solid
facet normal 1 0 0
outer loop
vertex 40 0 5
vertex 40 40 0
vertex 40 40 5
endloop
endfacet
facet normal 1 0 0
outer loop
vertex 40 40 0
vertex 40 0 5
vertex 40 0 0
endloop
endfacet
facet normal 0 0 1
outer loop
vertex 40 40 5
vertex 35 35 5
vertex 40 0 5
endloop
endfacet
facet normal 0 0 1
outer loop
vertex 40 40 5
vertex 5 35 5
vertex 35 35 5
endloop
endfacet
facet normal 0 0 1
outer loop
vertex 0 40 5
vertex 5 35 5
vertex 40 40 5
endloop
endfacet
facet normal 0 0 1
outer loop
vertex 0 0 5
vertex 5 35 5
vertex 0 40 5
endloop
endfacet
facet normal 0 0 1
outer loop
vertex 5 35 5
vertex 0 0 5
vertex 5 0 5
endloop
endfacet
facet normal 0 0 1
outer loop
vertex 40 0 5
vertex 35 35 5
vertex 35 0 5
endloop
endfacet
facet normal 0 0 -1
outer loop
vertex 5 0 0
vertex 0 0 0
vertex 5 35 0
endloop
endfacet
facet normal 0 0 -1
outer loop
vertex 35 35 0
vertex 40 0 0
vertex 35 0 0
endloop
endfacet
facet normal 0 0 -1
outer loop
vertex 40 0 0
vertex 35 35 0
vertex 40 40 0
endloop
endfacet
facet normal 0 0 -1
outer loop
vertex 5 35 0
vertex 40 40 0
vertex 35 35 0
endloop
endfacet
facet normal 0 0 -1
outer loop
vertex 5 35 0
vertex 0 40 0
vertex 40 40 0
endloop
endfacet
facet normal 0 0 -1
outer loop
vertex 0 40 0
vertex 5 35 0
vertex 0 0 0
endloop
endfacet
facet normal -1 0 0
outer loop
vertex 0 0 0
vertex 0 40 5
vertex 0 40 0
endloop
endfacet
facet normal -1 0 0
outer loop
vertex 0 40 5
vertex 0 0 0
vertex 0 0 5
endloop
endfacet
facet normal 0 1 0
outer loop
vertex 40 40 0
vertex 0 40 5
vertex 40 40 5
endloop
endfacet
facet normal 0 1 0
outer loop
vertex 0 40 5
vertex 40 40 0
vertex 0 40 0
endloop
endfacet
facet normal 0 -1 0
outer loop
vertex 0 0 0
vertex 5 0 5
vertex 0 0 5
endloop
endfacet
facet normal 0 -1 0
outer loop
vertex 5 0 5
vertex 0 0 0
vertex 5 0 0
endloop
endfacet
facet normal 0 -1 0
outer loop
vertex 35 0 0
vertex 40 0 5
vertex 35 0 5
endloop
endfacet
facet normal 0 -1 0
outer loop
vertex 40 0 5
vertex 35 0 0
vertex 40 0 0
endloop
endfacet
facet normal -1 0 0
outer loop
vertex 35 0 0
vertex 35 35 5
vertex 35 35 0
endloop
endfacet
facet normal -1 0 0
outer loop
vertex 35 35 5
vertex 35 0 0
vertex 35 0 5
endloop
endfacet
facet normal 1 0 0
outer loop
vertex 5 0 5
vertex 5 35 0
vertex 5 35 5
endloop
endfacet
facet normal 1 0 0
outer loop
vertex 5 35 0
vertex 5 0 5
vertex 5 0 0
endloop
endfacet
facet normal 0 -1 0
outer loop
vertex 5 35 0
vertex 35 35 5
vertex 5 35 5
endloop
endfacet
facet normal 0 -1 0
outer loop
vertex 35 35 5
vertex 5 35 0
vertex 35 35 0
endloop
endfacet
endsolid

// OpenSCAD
difference() {
	cube([40, 40, 5]);
	translate([5, 0, 0]) {
		cube([30, 35, 5]);
	}
}
